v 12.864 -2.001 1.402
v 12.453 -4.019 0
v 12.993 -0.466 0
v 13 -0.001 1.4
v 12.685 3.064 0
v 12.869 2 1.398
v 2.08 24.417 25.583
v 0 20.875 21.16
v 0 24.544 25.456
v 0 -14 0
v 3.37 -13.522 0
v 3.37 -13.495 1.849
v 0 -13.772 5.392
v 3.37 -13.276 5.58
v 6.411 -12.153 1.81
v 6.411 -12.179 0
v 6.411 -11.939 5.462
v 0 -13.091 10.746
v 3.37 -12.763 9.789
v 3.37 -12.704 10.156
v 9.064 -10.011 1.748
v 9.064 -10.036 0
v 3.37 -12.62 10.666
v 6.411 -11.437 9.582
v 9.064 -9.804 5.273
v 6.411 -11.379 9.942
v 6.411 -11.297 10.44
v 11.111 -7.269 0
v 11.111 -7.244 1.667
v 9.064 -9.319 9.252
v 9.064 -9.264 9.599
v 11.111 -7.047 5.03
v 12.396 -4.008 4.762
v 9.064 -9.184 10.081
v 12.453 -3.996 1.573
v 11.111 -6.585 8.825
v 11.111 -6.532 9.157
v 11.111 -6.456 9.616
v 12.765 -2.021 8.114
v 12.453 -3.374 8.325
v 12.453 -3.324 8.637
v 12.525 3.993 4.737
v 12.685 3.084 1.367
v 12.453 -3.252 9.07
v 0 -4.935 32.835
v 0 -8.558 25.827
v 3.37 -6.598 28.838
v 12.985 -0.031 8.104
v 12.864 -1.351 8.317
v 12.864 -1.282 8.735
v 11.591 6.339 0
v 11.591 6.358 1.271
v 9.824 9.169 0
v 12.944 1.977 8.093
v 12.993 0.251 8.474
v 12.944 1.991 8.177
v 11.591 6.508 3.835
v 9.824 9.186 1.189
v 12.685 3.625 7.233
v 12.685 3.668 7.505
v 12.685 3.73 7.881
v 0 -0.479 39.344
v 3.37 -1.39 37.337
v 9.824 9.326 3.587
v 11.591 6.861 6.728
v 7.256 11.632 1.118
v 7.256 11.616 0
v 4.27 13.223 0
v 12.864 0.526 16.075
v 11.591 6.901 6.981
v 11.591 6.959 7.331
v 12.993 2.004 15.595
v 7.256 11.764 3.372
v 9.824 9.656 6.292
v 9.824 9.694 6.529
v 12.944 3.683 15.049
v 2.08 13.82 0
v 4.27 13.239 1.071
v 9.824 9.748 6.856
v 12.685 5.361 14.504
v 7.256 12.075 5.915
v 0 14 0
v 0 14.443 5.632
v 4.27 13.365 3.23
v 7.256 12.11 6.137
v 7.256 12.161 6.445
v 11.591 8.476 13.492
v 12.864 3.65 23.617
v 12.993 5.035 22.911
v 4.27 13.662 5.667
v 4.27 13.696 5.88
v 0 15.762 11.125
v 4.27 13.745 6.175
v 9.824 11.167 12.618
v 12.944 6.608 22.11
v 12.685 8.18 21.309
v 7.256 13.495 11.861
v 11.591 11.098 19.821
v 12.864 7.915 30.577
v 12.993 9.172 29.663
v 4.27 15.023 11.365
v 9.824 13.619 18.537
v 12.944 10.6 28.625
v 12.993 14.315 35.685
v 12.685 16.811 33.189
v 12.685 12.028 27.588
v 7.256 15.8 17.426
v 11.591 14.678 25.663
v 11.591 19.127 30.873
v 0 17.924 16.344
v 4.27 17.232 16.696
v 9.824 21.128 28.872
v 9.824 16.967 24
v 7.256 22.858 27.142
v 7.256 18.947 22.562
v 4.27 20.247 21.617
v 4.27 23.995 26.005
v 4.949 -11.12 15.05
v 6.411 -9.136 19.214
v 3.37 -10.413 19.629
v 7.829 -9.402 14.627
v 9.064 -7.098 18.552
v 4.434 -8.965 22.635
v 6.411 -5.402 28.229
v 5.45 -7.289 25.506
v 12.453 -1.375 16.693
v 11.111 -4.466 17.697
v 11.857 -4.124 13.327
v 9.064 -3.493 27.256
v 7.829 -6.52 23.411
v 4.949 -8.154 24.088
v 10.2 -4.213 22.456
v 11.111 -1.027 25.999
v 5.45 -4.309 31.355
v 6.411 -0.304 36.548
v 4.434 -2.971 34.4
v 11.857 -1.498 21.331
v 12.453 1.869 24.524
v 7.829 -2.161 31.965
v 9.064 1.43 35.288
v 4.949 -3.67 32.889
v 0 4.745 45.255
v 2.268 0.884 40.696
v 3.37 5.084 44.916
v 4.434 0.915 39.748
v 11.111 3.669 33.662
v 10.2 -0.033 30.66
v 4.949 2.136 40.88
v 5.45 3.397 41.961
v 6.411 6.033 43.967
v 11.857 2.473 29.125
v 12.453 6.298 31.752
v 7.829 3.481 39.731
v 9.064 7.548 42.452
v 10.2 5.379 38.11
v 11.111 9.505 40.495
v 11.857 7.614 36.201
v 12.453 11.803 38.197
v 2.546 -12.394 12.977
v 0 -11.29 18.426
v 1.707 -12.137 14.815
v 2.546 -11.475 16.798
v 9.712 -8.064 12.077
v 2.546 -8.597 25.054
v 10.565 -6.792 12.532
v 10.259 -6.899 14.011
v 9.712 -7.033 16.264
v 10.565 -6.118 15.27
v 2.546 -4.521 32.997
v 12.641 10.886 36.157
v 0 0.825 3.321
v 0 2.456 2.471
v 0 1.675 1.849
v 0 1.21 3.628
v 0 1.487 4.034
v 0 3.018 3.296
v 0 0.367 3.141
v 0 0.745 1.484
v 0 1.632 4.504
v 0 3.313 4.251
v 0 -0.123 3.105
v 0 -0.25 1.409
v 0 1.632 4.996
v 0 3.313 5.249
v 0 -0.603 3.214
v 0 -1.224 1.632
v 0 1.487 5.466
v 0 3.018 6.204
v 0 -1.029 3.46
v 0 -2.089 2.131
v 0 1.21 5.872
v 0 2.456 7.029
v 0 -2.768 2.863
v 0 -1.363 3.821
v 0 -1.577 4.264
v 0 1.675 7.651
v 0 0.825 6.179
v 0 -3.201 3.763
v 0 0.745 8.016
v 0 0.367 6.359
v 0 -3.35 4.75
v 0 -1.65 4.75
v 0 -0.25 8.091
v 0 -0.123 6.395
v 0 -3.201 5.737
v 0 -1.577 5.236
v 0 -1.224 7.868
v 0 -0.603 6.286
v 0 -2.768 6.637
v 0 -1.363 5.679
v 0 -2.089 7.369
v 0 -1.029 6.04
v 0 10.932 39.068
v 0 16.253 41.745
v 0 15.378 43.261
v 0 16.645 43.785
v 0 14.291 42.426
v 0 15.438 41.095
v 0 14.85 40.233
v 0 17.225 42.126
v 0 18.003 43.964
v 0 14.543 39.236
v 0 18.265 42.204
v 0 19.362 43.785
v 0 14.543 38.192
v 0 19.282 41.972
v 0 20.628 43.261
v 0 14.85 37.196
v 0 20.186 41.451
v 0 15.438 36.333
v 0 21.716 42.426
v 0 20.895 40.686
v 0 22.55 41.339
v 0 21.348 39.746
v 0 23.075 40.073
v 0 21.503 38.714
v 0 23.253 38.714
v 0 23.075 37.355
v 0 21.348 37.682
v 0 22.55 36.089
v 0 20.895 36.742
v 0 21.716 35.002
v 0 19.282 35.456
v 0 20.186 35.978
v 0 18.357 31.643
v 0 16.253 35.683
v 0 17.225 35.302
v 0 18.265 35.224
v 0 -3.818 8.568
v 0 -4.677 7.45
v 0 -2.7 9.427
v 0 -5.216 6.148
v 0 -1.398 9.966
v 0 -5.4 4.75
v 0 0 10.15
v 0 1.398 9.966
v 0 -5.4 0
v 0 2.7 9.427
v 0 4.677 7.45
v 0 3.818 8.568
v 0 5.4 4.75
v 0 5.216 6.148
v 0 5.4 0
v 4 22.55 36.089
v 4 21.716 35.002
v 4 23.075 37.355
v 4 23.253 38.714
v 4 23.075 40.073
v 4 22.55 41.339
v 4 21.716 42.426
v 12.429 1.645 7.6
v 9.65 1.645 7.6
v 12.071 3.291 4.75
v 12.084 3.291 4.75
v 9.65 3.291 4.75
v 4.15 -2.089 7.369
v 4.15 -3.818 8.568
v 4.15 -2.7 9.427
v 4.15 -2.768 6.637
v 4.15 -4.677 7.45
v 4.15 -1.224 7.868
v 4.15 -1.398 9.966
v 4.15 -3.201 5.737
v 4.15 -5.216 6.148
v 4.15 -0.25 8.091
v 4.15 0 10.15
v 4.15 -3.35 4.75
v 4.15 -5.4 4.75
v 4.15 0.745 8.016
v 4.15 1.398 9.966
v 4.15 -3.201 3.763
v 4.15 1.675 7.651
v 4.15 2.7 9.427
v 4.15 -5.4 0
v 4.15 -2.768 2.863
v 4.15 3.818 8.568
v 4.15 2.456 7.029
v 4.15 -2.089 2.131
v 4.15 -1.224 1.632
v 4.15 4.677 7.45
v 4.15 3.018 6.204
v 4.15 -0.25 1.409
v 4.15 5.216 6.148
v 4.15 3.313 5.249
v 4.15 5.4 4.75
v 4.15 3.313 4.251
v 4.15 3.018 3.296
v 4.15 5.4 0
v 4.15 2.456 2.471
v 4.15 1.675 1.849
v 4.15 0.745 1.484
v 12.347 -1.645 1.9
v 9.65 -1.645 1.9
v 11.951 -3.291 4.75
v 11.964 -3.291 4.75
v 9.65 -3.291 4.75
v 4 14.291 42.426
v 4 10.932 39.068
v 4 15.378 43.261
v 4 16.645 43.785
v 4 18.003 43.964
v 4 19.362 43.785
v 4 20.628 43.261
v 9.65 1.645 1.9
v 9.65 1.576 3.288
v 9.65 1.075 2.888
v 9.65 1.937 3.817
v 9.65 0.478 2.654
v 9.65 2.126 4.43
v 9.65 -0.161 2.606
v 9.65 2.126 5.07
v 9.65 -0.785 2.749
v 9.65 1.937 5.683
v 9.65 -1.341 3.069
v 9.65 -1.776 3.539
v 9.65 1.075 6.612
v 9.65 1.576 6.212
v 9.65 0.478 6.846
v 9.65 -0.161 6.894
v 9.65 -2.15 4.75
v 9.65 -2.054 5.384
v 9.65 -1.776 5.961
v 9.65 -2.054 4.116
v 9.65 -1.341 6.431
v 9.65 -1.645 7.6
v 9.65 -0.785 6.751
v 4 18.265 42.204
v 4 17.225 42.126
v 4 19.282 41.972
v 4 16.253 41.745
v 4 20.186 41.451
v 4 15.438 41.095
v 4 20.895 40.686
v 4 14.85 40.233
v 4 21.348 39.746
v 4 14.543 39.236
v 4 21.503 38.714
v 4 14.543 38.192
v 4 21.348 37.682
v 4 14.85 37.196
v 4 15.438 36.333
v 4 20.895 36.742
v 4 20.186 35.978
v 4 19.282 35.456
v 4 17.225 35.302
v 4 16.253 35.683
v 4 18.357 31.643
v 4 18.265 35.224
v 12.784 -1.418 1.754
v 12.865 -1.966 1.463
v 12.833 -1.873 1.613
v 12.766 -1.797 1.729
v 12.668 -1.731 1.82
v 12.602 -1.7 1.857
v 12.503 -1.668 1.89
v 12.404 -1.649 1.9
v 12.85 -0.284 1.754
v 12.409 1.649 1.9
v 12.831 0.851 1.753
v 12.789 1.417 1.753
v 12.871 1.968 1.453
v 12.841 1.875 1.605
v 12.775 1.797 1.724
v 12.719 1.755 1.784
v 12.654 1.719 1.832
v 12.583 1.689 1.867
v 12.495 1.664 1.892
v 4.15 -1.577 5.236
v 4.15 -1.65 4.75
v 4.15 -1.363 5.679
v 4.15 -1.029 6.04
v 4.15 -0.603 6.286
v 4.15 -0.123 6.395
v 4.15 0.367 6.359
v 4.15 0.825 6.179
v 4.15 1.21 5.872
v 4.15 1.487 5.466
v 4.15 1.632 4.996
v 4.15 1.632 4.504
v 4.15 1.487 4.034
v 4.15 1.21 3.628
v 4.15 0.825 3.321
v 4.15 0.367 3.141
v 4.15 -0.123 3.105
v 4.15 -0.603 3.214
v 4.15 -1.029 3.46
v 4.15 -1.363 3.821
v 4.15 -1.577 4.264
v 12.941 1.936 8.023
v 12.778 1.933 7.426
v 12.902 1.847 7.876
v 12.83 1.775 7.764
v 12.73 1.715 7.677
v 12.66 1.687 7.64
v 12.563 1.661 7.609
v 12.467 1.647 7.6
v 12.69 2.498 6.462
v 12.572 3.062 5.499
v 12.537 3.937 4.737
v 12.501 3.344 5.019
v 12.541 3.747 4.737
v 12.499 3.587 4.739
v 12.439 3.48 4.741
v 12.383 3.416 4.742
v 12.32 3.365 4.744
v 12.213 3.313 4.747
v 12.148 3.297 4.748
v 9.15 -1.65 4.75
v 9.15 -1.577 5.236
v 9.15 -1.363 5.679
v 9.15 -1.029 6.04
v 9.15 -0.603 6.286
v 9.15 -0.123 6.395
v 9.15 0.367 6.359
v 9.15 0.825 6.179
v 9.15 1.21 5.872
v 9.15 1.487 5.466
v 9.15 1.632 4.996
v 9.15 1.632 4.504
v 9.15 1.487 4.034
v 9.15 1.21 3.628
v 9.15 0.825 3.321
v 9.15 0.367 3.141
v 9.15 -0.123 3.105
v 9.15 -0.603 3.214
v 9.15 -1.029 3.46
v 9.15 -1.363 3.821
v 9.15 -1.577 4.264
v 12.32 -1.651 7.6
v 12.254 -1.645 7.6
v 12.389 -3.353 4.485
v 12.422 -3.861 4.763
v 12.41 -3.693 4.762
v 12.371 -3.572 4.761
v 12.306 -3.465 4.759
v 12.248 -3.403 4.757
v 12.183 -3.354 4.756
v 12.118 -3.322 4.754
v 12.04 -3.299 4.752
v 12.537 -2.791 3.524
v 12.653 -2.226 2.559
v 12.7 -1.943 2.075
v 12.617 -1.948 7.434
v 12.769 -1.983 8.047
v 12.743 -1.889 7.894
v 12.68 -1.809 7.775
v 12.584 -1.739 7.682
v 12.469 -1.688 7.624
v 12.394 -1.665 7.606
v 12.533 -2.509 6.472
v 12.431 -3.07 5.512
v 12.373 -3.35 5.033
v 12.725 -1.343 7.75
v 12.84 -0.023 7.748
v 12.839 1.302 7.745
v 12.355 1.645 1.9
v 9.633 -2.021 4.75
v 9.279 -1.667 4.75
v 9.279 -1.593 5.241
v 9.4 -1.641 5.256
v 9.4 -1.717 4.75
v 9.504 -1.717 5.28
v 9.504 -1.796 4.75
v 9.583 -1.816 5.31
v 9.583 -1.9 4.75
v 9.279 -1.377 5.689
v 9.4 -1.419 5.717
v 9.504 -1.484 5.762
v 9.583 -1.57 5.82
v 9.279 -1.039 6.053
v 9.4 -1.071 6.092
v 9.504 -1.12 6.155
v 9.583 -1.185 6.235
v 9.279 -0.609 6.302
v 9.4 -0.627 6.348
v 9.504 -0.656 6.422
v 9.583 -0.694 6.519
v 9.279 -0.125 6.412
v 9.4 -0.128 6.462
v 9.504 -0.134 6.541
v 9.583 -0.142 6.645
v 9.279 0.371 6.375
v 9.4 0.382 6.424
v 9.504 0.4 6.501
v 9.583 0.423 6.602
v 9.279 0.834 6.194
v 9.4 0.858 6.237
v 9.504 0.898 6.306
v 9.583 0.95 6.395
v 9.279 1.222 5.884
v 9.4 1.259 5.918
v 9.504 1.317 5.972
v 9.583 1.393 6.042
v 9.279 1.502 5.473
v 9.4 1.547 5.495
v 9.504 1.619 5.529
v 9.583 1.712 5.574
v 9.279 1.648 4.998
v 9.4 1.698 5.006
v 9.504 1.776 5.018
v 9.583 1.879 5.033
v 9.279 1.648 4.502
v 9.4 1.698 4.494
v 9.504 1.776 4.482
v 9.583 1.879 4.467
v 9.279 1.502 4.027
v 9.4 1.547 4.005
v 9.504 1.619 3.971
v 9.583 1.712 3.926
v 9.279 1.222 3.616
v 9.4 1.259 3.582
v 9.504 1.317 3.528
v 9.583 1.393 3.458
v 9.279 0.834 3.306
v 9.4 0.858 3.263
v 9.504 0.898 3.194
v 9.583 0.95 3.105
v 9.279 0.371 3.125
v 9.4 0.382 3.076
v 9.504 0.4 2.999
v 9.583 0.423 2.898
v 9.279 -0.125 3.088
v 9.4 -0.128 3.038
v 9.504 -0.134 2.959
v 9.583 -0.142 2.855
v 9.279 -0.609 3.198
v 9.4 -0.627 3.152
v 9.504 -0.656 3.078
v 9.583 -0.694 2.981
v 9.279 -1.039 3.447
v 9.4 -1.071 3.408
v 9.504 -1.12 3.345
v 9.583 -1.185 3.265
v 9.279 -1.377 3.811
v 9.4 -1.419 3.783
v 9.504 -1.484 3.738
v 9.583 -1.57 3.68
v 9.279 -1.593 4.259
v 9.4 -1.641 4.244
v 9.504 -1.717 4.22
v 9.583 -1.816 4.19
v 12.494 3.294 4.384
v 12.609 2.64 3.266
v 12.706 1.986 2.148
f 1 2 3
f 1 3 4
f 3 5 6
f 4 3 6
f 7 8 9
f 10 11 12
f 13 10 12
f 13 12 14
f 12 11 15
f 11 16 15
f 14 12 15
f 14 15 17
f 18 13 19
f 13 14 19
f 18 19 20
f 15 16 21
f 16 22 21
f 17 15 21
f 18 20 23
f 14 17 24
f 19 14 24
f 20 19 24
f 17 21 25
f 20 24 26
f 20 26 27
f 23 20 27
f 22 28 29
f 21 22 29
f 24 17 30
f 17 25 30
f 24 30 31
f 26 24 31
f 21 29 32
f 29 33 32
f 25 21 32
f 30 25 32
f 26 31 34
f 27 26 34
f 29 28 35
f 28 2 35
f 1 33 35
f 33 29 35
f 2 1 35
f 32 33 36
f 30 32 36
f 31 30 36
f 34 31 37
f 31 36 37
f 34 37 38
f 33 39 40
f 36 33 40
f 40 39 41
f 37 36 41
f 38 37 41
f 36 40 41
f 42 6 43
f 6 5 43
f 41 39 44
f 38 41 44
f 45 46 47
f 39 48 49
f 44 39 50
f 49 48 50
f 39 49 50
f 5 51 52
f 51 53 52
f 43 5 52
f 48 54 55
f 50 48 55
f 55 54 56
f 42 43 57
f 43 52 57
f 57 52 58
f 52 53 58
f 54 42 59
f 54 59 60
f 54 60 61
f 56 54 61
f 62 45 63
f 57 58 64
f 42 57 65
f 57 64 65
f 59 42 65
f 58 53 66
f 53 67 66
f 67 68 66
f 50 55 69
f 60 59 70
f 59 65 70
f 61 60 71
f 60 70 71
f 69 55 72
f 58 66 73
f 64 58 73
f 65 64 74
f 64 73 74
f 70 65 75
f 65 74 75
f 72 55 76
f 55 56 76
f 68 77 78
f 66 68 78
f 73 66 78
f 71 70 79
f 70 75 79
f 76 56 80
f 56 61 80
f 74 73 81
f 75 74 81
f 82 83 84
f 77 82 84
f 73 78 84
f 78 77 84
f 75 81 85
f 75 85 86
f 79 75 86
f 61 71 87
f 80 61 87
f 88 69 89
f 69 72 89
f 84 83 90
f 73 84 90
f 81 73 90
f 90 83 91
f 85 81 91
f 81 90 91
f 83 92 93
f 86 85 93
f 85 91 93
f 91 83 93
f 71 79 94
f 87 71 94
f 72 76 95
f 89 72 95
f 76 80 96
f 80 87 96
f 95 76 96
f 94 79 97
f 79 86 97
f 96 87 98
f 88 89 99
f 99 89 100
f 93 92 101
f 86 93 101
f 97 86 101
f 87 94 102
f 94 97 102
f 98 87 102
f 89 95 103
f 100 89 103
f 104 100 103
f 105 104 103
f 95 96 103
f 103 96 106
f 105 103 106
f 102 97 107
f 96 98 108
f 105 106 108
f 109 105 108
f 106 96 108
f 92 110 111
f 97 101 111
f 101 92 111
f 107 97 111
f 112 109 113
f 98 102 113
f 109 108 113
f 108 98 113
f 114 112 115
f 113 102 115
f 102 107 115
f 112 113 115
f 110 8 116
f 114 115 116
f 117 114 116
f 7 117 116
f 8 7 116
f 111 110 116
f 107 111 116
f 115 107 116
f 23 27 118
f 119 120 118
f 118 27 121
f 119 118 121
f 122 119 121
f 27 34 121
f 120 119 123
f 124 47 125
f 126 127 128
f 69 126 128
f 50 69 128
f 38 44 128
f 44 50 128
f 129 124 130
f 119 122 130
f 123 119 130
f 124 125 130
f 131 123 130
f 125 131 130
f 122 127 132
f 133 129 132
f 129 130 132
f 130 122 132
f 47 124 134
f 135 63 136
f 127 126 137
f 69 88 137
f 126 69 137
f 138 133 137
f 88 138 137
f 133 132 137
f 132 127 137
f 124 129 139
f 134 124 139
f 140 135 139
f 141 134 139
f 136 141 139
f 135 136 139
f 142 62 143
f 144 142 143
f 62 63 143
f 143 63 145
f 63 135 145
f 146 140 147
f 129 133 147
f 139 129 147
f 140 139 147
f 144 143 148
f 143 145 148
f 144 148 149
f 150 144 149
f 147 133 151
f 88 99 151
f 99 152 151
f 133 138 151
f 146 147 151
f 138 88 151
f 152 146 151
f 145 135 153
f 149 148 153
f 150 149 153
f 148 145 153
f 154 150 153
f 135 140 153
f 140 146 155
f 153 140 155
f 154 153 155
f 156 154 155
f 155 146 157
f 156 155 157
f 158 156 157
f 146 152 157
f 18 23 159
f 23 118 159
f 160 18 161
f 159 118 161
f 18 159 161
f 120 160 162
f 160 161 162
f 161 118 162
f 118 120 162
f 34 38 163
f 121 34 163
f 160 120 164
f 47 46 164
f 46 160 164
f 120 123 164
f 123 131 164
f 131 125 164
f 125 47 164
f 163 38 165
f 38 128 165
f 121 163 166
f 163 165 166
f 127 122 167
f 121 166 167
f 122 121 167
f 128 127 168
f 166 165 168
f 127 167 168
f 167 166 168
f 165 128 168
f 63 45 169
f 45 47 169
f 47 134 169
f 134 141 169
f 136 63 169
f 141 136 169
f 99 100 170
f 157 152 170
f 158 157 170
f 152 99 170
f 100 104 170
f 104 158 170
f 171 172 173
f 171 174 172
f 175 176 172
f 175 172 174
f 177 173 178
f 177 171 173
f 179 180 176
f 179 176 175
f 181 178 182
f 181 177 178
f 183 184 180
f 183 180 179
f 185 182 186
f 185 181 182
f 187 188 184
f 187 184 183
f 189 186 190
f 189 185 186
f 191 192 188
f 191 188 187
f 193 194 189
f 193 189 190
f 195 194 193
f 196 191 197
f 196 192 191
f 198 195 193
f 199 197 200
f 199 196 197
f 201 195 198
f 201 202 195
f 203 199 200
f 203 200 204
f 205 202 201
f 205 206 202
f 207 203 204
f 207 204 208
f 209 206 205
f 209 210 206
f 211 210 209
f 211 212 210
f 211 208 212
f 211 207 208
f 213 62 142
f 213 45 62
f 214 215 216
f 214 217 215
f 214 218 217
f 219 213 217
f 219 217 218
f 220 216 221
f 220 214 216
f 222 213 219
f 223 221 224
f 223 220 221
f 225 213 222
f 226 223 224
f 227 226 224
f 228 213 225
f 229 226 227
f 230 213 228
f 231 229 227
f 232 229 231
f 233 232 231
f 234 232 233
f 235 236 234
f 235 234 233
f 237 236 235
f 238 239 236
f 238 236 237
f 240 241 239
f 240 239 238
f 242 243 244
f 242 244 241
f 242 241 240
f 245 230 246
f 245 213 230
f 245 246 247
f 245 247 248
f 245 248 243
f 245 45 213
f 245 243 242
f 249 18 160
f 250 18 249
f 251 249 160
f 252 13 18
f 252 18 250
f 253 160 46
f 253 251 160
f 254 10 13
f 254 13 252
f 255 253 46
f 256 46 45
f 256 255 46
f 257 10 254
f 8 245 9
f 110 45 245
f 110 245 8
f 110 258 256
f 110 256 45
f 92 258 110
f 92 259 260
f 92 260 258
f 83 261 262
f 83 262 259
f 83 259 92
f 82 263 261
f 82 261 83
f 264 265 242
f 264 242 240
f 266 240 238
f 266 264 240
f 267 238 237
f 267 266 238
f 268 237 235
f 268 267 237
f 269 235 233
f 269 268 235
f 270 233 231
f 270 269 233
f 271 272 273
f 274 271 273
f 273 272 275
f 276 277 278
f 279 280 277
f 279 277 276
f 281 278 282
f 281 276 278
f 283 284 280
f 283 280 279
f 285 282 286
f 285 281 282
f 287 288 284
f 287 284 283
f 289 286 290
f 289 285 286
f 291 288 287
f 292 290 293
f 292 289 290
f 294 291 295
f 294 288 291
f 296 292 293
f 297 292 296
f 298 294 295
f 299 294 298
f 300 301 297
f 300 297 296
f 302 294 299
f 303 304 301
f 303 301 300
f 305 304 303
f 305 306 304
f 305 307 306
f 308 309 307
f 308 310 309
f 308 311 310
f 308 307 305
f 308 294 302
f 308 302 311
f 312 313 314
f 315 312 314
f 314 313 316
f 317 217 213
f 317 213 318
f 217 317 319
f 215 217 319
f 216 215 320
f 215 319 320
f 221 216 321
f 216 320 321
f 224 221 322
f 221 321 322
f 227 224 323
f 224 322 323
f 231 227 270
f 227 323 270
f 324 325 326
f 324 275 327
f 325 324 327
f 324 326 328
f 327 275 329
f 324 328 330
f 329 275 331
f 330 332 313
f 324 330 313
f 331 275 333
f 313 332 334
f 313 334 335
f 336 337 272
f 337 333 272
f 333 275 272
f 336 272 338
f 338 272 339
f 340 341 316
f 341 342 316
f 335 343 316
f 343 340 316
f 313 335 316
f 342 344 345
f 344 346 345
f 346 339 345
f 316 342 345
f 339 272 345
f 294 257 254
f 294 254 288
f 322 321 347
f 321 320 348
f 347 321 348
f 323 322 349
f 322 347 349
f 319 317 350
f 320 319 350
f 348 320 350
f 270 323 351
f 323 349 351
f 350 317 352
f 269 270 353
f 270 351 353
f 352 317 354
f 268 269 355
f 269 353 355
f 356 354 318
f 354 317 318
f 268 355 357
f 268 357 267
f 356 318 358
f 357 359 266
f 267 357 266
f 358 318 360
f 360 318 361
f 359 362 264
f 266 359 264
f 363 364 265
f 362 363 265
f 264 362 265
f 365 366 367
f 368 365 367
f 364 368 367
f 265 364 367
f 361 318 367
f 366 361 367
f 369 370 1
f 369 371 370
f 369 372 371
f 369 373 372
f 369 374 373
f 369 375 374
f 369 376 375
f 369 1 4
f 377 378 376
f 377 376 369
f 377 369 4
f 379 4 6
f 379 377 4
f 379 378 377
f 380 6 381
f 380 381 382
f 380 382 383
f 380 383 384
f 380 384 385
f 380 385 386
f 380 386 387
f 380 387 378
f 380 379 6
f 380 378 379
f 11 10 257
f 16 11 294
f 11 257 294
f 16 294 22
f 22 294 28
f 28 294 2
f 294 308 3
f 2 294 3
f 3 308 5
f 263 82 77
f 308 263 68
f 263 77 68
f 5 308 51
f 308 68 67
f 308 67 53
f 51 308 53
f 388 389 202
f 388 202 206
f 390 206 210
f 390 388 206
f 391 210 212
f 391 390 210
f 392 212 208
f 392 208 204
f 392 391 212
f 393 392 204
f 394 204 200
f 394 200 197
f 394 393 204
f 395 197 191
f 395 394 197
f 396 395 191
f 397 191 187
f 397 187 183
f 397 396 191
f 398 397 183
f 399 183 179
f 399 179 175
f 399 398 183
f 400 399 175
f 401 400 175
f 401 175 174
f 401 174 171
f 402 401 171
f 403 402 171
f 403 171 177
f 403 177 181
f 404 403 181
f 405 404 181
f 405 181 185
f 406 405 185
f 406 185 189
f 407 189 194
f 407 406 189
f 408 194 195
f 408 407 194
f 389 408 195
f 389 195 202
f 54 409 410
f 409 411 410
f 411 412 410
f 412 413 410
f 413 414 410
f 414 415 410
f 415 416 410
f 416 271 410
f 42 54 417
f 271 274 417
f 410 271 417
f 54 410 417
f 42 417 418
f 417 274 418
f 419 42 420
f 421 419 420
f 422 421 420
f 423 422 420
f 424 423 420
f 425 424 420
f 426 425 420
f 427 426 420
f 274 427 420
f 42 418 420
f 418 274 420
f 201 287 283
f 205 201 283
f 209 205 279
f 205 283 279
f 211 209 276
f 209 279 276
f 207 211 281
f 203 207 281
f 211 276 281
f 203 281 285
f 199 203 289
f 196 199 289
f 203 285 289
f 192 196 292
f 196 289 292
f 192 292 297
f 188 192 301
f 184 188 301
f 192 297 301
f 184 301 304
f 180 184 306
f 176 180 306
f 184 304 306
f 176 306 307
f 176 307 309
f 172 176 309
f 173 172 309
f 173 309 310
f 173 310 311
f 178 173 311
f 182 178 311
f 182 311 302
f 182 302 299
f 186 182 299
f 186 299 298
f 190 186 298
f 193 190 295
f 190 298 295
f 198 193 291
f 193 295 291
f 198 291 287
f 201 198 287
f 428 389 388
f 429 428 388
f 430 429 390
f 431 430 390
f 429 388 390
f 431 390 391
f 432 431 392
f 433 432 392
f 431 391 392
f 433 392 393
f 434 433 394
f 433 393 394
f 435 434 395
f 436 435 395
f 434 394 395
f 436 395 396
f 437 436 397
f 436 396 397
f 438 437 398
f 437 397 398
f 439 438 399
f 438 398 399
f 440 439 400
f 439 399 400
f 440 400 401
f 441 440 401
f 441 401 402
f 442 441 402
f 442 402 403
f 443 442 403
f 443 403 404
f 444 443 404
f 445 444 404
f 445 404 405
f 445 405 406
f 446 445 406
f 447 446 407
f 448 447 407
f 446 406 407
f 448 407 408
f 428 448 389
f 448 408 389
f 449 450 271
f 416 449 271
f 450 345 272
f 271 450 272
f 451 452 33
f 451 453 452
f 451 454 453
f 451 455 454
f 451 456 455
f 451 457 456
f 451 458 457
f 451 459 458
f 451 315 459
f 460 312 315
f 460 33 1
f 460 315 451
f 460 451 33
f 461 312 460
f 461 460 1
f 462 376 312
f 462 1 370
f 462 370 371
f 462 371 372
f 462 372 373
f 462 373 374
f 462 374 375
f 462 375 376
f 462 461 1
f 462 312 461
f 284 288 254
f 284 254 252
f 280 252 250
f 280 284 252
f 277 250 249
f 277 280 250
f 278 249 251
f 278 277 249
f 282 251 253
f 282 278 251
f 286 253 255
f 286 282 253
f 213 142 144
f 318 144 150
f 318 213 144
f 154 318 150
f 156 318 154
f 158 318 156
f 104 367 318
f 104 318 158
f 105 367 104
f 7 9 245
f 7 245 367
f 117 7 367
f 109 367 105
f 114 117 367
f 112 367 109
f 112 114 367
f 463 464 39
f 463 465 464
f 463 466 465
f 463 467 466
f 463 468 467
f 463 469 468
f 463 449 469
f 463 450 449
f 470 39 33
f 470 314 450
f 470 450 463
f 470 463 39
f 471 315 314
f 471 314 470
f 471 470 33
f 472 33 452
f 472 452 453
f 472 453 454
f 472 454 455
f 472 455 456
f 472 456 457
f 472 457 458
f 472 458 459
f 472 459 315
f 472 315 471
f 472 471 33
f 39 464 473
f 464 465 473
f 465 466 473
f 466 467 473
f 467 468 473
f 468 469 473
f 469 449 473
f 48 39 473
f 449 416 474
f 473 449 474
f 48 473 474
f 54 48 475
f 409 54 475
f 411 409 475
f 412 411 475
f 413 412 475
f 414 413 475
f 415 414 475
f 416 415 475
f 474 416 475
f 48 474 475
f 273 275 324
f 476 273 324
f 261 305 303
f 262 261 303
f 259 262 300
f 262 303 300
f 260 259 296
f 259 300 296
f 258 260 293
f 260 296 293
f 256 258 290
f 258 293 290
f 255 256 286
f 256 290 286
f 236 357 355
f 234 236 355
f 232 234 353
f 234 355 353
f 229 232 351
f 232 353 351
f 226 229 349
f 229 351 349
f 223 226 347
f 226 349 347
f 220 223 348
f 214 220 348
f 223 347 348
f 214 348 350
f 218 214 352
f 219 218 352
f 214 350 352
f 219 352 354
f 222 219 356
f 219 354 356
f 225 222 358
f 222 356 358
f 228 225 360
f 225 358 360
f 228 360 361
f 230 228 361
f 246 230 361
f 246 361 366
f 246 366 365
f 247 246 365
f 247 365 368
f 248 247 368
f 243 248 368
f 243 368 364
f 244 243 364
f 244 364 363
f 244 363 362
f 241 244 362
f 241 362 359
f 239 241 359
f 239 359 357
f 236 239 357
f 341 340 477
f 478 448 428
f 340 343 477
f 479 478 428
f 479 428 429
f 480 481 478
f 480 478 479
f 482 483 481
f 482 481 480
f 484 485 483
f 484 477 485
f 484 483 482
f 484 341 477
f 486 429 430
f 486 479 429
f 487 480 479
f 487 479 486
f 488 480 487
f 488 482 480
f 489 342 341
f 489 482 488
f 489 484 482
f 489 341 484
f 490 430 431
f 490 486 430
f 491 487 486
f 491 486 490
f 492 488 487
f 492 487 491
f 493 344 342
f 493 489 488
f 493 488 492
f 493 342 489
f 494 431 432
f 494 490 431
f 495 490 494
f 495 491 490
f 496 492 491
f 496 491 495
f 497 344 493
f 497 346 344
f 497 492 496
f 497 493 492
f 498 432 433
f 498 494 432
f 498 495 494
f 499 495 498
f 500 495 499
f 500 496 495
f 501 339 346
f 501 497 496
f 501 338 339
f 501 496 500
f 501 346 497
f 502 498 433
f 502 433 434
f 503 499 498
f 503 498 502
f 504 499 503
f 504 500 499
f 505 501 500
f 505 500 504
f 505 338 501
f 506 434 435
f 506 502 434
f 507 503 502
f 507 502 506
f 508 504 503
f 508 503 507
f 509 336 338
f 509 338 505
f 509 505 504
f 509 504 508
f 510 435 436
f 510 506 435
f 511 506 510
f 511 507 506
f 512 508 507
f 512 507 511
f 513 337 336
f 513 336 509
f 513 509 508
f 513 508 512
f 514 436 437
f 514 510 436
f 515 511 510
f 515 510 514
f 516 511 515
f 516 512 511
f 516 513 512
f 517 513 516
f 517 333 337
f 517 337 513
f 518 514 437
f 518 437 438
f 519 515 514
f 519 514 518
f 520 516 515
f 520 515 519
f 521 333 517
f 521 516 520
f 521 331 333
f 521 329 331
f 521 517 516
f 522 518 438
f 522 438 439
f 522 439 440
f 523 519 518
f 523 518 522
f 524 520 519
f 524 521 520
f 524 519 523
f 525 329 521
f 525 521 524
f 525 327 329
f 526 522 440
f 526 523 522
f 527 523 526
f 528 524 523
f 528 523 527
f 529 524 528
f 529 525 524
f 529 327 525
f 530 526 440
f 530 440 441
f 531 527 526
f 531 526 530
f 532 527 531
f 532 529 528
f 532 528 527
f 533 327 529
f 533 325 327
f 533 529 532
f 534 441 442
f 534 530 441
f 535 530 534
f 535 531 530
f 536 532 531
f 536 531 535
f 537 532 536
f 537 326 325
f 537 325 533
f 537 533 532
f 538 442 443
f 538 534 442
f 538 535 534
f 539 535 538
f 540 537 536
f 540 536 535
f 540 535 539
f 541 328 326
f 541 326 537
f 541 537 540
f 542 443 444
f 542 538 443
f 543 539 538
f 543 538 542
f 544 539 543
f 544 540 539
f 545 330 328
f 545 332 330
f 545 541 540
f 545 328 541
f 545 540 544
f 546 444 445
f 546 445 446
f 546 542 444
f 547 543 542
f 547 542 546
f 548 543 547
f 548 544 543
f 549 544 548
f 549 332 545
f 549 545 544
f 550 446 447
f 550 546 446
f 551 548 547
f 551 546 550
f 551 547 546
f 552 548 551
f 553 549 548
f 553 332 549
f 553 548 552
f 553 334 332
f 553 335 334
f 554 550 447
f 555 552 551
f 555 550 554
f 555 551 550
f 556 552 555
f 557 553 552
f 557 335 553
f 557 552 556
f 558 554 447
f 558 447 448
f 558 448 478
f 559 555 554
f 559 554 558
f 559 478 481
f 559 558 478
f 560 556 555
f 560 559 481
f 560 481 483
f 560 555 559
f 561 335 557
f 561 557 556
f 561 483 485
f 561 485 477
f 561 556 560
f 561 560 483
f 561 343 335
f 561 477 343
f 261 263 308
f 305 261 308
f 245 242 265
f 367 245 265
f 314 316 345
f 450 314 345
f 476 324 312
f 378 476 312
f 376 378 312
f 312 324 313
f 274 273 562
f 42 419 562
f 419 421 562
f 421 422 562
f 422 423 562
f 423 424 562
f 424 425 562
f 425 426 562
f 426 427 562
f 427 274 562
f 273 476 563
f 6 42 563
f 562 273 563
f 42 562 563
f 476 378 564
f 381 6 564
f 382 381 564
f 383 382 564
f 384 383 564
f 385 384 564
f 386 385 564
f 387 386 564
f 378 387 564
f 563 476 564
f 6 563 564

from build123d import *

# Parameters (mm, degrees)
F0_W      = 8.3
F0_H      = 10.8
F1_ANGLE  = 45
F2_W      = 8
F2_H      = 10.5
F3_DEPTH  = 10
F4_R      = 5.24999
F5_R      = 3.5
F6_DEPTH  = 17.0010001
F7_DEPTH  = 10.15
F8_R      = 5.39999
F9_W      = 20
F9_H      = 70
F10_DEPTH = 50
F11_R     = 3.35
F11_R_2   = 1.65
F12_DEPTH = 4.15
F13_DEPTH = 25
F14_R     = 1.65
F15_DEPTH = 25
F16_DEPTH = 5.5
F17_R     = 0.5


# Not quite as in the source:
# - a fillet or chamfer is up to 0.001 mm smaller than in the source, because OpenCascade refuses the exact size


with BuildPart() as f1:
    # F0 (on Top) → F1 (revolve)
    with BuildSketch(Plane.XY):
        with BuildLine():
            add(Edge.make_bspline(
                [(0, 14), (-22.5166604984, 14), (-11.2583302492, -7), (0, -28), (11.2583302492, -7), (22.5166604984, 14), (0, 14)],
                knots=[0, 0, 0, 2.0943951024, 2.0943951024, 4.1887902048, 4.1887902048, 6.2831853072, 6.2831853072, 6.2831853072], degree=2, weights=[1, 0.5, 1, 0.5, 1, 0.5, 1]))
        make_face()
        Rectangle(F0_W, F0_H, mode=Mode.SUBTRACT)
        Rectangle(F0_W, F0_H)
    revolve(axis=Axis((13.7635422871, 50, 0), (-1, 0, 0)), revolution_arc=F1_ANGLE)

    # F2 (on face) → F3 (join)
    with BuildSketch(Plane(origin=(0, 25, 25), x_dir=(1, 0, 0), z_dir=(0, 0.7071067812, 0.7071067812))):
        with Locations((0, -14.6446609407)):
            Rectangle(F2_W, F2_H)
    extrude(amount=F3_DEPTH)

    # F4 (radius 5.25 in the source; OpenCascade refuses exactly that, so slightly less here)
    f4_edges = [f1.edges().sort_by_distance(p)[0] for p in [
        (0, 18.003418, 46.138717),
        (0, 25.428039, 38.714096),
    ]]
    fillet(f4_edges, radius=F4_R)

    # F5 (on face) → F6 (cut, through all)
    with BuildSketch(Plane.YZ.offset(4)):
        with Locations((18.0034181513, 38.71409627)):
            Circle(F5_R)
    extrude(amount=-F6_DEPTH, mode=Mode.SUBTRACT)

    # F0 (on Top) → F7 (cut)
    with BuildSketch(Plane.XY):
        Rectangle(F0_W, F0_H)
    extrude(amount=F7_DEPTH, mode=Mode.SUBTRACT)

    # F8 (radius 5.4 in the source; OpenCascade refuses exactly that, so slightly less here)
    f8_edges = [f1.edges().sort_by_distance(p)[0] for p in [
        (0, 5.4, 10.15),
        (0, -5.4, 10.15),
    ]]
    fillet(f8_edges, radius=F8_R)

    # F9 (on Top) → F10 (intersect)
    with BuildSketch(Plane.XY):
        with Locations((10, 0)):
            Rectangle(F9_W, F9_H)
    extrude(amount=F10_DEPTH, mode=Mode.INTERSECT)

    # F11 (on face) → F12 (join)
    with BuildSketch(Plane(origin=(4.15, 0, 0), x_dir=(0, -1, 0), z_dir=(-1, 0, 0))):
        with Locations((0, 4.75)):
            Circle(F11_R)
        with Locations((0, 4.75)):
            Circle(F11_R_2, mode=Mode.SUBTRACT)
    extrude(amount=F12_DEPTH)

    # F13 (cut): a face of the model
    f13_faces = [f1.faces().sort_by_distance(p)[0] for p in [
        (4.15, 0, 4.75),
    ]]
    extrude(f13_faces, amount=-F13_DEPTH, mode=Mode.SUBTRACT)

    # F14 (on face) → F15 (cut)
    with BuildSketch(Plane(origin=(4.15, 0, 0), x_dir=(0, -1, 0), z_dir=(-1, 0, 0))):
        Polygon((1.6454482672, 7.6), (-1.6454482672, 7.6), (-3.2908965344, 4.75), (-1.6454482672, 1.9), (1.6454482672, 1.9), (3.2908965344, 4.75), align=None)
        with Locations((0, 4.75)):
            Circle(F14_R, mode=Mode.SUBTRACT)
    extrude(amount=-F15_DEPTH, mode=Mode.SUBTRACT)

    # F14 (on face) → F16 (join)
    with BuildSketch(Plane(origin=(4.15, 0, 0), x_dir=(0, -1, 0), z_dir=(-1, 0, 0))):
        Polygon((1.6454482672, 7.6), (-1.6454482672, 7.6), (-3.2908965344, 4.75), (-1.6454482672, 1.9), (1.6454482672, 1.9), (3.2908965344, 4.75), align=None)
        with Locations((0, 4.75)):
            Circle(F14_R, mode=Mode.SUBTRACT)
    extrude(amount=-F16_DEPTH)

    # F17
    f17_edges = [f1.edges().sort_by_distance(p)[0] for p in [
        (12.999956, -0.000217, 1.9),
        (12.77819, -2.469724, 3.327687),
        (12.731462, -2.468902, 6.173737),
        (12.988931, -0.003353, 7.6),
        (12.857066, 2.469489, 6.17272),
        (12.81516, 2.468662, 3.325848),
        (9.65, 1.65, 4.75),
    ]]
    fillet(f17_edges, radius=F17_R)


solid = f1.part
